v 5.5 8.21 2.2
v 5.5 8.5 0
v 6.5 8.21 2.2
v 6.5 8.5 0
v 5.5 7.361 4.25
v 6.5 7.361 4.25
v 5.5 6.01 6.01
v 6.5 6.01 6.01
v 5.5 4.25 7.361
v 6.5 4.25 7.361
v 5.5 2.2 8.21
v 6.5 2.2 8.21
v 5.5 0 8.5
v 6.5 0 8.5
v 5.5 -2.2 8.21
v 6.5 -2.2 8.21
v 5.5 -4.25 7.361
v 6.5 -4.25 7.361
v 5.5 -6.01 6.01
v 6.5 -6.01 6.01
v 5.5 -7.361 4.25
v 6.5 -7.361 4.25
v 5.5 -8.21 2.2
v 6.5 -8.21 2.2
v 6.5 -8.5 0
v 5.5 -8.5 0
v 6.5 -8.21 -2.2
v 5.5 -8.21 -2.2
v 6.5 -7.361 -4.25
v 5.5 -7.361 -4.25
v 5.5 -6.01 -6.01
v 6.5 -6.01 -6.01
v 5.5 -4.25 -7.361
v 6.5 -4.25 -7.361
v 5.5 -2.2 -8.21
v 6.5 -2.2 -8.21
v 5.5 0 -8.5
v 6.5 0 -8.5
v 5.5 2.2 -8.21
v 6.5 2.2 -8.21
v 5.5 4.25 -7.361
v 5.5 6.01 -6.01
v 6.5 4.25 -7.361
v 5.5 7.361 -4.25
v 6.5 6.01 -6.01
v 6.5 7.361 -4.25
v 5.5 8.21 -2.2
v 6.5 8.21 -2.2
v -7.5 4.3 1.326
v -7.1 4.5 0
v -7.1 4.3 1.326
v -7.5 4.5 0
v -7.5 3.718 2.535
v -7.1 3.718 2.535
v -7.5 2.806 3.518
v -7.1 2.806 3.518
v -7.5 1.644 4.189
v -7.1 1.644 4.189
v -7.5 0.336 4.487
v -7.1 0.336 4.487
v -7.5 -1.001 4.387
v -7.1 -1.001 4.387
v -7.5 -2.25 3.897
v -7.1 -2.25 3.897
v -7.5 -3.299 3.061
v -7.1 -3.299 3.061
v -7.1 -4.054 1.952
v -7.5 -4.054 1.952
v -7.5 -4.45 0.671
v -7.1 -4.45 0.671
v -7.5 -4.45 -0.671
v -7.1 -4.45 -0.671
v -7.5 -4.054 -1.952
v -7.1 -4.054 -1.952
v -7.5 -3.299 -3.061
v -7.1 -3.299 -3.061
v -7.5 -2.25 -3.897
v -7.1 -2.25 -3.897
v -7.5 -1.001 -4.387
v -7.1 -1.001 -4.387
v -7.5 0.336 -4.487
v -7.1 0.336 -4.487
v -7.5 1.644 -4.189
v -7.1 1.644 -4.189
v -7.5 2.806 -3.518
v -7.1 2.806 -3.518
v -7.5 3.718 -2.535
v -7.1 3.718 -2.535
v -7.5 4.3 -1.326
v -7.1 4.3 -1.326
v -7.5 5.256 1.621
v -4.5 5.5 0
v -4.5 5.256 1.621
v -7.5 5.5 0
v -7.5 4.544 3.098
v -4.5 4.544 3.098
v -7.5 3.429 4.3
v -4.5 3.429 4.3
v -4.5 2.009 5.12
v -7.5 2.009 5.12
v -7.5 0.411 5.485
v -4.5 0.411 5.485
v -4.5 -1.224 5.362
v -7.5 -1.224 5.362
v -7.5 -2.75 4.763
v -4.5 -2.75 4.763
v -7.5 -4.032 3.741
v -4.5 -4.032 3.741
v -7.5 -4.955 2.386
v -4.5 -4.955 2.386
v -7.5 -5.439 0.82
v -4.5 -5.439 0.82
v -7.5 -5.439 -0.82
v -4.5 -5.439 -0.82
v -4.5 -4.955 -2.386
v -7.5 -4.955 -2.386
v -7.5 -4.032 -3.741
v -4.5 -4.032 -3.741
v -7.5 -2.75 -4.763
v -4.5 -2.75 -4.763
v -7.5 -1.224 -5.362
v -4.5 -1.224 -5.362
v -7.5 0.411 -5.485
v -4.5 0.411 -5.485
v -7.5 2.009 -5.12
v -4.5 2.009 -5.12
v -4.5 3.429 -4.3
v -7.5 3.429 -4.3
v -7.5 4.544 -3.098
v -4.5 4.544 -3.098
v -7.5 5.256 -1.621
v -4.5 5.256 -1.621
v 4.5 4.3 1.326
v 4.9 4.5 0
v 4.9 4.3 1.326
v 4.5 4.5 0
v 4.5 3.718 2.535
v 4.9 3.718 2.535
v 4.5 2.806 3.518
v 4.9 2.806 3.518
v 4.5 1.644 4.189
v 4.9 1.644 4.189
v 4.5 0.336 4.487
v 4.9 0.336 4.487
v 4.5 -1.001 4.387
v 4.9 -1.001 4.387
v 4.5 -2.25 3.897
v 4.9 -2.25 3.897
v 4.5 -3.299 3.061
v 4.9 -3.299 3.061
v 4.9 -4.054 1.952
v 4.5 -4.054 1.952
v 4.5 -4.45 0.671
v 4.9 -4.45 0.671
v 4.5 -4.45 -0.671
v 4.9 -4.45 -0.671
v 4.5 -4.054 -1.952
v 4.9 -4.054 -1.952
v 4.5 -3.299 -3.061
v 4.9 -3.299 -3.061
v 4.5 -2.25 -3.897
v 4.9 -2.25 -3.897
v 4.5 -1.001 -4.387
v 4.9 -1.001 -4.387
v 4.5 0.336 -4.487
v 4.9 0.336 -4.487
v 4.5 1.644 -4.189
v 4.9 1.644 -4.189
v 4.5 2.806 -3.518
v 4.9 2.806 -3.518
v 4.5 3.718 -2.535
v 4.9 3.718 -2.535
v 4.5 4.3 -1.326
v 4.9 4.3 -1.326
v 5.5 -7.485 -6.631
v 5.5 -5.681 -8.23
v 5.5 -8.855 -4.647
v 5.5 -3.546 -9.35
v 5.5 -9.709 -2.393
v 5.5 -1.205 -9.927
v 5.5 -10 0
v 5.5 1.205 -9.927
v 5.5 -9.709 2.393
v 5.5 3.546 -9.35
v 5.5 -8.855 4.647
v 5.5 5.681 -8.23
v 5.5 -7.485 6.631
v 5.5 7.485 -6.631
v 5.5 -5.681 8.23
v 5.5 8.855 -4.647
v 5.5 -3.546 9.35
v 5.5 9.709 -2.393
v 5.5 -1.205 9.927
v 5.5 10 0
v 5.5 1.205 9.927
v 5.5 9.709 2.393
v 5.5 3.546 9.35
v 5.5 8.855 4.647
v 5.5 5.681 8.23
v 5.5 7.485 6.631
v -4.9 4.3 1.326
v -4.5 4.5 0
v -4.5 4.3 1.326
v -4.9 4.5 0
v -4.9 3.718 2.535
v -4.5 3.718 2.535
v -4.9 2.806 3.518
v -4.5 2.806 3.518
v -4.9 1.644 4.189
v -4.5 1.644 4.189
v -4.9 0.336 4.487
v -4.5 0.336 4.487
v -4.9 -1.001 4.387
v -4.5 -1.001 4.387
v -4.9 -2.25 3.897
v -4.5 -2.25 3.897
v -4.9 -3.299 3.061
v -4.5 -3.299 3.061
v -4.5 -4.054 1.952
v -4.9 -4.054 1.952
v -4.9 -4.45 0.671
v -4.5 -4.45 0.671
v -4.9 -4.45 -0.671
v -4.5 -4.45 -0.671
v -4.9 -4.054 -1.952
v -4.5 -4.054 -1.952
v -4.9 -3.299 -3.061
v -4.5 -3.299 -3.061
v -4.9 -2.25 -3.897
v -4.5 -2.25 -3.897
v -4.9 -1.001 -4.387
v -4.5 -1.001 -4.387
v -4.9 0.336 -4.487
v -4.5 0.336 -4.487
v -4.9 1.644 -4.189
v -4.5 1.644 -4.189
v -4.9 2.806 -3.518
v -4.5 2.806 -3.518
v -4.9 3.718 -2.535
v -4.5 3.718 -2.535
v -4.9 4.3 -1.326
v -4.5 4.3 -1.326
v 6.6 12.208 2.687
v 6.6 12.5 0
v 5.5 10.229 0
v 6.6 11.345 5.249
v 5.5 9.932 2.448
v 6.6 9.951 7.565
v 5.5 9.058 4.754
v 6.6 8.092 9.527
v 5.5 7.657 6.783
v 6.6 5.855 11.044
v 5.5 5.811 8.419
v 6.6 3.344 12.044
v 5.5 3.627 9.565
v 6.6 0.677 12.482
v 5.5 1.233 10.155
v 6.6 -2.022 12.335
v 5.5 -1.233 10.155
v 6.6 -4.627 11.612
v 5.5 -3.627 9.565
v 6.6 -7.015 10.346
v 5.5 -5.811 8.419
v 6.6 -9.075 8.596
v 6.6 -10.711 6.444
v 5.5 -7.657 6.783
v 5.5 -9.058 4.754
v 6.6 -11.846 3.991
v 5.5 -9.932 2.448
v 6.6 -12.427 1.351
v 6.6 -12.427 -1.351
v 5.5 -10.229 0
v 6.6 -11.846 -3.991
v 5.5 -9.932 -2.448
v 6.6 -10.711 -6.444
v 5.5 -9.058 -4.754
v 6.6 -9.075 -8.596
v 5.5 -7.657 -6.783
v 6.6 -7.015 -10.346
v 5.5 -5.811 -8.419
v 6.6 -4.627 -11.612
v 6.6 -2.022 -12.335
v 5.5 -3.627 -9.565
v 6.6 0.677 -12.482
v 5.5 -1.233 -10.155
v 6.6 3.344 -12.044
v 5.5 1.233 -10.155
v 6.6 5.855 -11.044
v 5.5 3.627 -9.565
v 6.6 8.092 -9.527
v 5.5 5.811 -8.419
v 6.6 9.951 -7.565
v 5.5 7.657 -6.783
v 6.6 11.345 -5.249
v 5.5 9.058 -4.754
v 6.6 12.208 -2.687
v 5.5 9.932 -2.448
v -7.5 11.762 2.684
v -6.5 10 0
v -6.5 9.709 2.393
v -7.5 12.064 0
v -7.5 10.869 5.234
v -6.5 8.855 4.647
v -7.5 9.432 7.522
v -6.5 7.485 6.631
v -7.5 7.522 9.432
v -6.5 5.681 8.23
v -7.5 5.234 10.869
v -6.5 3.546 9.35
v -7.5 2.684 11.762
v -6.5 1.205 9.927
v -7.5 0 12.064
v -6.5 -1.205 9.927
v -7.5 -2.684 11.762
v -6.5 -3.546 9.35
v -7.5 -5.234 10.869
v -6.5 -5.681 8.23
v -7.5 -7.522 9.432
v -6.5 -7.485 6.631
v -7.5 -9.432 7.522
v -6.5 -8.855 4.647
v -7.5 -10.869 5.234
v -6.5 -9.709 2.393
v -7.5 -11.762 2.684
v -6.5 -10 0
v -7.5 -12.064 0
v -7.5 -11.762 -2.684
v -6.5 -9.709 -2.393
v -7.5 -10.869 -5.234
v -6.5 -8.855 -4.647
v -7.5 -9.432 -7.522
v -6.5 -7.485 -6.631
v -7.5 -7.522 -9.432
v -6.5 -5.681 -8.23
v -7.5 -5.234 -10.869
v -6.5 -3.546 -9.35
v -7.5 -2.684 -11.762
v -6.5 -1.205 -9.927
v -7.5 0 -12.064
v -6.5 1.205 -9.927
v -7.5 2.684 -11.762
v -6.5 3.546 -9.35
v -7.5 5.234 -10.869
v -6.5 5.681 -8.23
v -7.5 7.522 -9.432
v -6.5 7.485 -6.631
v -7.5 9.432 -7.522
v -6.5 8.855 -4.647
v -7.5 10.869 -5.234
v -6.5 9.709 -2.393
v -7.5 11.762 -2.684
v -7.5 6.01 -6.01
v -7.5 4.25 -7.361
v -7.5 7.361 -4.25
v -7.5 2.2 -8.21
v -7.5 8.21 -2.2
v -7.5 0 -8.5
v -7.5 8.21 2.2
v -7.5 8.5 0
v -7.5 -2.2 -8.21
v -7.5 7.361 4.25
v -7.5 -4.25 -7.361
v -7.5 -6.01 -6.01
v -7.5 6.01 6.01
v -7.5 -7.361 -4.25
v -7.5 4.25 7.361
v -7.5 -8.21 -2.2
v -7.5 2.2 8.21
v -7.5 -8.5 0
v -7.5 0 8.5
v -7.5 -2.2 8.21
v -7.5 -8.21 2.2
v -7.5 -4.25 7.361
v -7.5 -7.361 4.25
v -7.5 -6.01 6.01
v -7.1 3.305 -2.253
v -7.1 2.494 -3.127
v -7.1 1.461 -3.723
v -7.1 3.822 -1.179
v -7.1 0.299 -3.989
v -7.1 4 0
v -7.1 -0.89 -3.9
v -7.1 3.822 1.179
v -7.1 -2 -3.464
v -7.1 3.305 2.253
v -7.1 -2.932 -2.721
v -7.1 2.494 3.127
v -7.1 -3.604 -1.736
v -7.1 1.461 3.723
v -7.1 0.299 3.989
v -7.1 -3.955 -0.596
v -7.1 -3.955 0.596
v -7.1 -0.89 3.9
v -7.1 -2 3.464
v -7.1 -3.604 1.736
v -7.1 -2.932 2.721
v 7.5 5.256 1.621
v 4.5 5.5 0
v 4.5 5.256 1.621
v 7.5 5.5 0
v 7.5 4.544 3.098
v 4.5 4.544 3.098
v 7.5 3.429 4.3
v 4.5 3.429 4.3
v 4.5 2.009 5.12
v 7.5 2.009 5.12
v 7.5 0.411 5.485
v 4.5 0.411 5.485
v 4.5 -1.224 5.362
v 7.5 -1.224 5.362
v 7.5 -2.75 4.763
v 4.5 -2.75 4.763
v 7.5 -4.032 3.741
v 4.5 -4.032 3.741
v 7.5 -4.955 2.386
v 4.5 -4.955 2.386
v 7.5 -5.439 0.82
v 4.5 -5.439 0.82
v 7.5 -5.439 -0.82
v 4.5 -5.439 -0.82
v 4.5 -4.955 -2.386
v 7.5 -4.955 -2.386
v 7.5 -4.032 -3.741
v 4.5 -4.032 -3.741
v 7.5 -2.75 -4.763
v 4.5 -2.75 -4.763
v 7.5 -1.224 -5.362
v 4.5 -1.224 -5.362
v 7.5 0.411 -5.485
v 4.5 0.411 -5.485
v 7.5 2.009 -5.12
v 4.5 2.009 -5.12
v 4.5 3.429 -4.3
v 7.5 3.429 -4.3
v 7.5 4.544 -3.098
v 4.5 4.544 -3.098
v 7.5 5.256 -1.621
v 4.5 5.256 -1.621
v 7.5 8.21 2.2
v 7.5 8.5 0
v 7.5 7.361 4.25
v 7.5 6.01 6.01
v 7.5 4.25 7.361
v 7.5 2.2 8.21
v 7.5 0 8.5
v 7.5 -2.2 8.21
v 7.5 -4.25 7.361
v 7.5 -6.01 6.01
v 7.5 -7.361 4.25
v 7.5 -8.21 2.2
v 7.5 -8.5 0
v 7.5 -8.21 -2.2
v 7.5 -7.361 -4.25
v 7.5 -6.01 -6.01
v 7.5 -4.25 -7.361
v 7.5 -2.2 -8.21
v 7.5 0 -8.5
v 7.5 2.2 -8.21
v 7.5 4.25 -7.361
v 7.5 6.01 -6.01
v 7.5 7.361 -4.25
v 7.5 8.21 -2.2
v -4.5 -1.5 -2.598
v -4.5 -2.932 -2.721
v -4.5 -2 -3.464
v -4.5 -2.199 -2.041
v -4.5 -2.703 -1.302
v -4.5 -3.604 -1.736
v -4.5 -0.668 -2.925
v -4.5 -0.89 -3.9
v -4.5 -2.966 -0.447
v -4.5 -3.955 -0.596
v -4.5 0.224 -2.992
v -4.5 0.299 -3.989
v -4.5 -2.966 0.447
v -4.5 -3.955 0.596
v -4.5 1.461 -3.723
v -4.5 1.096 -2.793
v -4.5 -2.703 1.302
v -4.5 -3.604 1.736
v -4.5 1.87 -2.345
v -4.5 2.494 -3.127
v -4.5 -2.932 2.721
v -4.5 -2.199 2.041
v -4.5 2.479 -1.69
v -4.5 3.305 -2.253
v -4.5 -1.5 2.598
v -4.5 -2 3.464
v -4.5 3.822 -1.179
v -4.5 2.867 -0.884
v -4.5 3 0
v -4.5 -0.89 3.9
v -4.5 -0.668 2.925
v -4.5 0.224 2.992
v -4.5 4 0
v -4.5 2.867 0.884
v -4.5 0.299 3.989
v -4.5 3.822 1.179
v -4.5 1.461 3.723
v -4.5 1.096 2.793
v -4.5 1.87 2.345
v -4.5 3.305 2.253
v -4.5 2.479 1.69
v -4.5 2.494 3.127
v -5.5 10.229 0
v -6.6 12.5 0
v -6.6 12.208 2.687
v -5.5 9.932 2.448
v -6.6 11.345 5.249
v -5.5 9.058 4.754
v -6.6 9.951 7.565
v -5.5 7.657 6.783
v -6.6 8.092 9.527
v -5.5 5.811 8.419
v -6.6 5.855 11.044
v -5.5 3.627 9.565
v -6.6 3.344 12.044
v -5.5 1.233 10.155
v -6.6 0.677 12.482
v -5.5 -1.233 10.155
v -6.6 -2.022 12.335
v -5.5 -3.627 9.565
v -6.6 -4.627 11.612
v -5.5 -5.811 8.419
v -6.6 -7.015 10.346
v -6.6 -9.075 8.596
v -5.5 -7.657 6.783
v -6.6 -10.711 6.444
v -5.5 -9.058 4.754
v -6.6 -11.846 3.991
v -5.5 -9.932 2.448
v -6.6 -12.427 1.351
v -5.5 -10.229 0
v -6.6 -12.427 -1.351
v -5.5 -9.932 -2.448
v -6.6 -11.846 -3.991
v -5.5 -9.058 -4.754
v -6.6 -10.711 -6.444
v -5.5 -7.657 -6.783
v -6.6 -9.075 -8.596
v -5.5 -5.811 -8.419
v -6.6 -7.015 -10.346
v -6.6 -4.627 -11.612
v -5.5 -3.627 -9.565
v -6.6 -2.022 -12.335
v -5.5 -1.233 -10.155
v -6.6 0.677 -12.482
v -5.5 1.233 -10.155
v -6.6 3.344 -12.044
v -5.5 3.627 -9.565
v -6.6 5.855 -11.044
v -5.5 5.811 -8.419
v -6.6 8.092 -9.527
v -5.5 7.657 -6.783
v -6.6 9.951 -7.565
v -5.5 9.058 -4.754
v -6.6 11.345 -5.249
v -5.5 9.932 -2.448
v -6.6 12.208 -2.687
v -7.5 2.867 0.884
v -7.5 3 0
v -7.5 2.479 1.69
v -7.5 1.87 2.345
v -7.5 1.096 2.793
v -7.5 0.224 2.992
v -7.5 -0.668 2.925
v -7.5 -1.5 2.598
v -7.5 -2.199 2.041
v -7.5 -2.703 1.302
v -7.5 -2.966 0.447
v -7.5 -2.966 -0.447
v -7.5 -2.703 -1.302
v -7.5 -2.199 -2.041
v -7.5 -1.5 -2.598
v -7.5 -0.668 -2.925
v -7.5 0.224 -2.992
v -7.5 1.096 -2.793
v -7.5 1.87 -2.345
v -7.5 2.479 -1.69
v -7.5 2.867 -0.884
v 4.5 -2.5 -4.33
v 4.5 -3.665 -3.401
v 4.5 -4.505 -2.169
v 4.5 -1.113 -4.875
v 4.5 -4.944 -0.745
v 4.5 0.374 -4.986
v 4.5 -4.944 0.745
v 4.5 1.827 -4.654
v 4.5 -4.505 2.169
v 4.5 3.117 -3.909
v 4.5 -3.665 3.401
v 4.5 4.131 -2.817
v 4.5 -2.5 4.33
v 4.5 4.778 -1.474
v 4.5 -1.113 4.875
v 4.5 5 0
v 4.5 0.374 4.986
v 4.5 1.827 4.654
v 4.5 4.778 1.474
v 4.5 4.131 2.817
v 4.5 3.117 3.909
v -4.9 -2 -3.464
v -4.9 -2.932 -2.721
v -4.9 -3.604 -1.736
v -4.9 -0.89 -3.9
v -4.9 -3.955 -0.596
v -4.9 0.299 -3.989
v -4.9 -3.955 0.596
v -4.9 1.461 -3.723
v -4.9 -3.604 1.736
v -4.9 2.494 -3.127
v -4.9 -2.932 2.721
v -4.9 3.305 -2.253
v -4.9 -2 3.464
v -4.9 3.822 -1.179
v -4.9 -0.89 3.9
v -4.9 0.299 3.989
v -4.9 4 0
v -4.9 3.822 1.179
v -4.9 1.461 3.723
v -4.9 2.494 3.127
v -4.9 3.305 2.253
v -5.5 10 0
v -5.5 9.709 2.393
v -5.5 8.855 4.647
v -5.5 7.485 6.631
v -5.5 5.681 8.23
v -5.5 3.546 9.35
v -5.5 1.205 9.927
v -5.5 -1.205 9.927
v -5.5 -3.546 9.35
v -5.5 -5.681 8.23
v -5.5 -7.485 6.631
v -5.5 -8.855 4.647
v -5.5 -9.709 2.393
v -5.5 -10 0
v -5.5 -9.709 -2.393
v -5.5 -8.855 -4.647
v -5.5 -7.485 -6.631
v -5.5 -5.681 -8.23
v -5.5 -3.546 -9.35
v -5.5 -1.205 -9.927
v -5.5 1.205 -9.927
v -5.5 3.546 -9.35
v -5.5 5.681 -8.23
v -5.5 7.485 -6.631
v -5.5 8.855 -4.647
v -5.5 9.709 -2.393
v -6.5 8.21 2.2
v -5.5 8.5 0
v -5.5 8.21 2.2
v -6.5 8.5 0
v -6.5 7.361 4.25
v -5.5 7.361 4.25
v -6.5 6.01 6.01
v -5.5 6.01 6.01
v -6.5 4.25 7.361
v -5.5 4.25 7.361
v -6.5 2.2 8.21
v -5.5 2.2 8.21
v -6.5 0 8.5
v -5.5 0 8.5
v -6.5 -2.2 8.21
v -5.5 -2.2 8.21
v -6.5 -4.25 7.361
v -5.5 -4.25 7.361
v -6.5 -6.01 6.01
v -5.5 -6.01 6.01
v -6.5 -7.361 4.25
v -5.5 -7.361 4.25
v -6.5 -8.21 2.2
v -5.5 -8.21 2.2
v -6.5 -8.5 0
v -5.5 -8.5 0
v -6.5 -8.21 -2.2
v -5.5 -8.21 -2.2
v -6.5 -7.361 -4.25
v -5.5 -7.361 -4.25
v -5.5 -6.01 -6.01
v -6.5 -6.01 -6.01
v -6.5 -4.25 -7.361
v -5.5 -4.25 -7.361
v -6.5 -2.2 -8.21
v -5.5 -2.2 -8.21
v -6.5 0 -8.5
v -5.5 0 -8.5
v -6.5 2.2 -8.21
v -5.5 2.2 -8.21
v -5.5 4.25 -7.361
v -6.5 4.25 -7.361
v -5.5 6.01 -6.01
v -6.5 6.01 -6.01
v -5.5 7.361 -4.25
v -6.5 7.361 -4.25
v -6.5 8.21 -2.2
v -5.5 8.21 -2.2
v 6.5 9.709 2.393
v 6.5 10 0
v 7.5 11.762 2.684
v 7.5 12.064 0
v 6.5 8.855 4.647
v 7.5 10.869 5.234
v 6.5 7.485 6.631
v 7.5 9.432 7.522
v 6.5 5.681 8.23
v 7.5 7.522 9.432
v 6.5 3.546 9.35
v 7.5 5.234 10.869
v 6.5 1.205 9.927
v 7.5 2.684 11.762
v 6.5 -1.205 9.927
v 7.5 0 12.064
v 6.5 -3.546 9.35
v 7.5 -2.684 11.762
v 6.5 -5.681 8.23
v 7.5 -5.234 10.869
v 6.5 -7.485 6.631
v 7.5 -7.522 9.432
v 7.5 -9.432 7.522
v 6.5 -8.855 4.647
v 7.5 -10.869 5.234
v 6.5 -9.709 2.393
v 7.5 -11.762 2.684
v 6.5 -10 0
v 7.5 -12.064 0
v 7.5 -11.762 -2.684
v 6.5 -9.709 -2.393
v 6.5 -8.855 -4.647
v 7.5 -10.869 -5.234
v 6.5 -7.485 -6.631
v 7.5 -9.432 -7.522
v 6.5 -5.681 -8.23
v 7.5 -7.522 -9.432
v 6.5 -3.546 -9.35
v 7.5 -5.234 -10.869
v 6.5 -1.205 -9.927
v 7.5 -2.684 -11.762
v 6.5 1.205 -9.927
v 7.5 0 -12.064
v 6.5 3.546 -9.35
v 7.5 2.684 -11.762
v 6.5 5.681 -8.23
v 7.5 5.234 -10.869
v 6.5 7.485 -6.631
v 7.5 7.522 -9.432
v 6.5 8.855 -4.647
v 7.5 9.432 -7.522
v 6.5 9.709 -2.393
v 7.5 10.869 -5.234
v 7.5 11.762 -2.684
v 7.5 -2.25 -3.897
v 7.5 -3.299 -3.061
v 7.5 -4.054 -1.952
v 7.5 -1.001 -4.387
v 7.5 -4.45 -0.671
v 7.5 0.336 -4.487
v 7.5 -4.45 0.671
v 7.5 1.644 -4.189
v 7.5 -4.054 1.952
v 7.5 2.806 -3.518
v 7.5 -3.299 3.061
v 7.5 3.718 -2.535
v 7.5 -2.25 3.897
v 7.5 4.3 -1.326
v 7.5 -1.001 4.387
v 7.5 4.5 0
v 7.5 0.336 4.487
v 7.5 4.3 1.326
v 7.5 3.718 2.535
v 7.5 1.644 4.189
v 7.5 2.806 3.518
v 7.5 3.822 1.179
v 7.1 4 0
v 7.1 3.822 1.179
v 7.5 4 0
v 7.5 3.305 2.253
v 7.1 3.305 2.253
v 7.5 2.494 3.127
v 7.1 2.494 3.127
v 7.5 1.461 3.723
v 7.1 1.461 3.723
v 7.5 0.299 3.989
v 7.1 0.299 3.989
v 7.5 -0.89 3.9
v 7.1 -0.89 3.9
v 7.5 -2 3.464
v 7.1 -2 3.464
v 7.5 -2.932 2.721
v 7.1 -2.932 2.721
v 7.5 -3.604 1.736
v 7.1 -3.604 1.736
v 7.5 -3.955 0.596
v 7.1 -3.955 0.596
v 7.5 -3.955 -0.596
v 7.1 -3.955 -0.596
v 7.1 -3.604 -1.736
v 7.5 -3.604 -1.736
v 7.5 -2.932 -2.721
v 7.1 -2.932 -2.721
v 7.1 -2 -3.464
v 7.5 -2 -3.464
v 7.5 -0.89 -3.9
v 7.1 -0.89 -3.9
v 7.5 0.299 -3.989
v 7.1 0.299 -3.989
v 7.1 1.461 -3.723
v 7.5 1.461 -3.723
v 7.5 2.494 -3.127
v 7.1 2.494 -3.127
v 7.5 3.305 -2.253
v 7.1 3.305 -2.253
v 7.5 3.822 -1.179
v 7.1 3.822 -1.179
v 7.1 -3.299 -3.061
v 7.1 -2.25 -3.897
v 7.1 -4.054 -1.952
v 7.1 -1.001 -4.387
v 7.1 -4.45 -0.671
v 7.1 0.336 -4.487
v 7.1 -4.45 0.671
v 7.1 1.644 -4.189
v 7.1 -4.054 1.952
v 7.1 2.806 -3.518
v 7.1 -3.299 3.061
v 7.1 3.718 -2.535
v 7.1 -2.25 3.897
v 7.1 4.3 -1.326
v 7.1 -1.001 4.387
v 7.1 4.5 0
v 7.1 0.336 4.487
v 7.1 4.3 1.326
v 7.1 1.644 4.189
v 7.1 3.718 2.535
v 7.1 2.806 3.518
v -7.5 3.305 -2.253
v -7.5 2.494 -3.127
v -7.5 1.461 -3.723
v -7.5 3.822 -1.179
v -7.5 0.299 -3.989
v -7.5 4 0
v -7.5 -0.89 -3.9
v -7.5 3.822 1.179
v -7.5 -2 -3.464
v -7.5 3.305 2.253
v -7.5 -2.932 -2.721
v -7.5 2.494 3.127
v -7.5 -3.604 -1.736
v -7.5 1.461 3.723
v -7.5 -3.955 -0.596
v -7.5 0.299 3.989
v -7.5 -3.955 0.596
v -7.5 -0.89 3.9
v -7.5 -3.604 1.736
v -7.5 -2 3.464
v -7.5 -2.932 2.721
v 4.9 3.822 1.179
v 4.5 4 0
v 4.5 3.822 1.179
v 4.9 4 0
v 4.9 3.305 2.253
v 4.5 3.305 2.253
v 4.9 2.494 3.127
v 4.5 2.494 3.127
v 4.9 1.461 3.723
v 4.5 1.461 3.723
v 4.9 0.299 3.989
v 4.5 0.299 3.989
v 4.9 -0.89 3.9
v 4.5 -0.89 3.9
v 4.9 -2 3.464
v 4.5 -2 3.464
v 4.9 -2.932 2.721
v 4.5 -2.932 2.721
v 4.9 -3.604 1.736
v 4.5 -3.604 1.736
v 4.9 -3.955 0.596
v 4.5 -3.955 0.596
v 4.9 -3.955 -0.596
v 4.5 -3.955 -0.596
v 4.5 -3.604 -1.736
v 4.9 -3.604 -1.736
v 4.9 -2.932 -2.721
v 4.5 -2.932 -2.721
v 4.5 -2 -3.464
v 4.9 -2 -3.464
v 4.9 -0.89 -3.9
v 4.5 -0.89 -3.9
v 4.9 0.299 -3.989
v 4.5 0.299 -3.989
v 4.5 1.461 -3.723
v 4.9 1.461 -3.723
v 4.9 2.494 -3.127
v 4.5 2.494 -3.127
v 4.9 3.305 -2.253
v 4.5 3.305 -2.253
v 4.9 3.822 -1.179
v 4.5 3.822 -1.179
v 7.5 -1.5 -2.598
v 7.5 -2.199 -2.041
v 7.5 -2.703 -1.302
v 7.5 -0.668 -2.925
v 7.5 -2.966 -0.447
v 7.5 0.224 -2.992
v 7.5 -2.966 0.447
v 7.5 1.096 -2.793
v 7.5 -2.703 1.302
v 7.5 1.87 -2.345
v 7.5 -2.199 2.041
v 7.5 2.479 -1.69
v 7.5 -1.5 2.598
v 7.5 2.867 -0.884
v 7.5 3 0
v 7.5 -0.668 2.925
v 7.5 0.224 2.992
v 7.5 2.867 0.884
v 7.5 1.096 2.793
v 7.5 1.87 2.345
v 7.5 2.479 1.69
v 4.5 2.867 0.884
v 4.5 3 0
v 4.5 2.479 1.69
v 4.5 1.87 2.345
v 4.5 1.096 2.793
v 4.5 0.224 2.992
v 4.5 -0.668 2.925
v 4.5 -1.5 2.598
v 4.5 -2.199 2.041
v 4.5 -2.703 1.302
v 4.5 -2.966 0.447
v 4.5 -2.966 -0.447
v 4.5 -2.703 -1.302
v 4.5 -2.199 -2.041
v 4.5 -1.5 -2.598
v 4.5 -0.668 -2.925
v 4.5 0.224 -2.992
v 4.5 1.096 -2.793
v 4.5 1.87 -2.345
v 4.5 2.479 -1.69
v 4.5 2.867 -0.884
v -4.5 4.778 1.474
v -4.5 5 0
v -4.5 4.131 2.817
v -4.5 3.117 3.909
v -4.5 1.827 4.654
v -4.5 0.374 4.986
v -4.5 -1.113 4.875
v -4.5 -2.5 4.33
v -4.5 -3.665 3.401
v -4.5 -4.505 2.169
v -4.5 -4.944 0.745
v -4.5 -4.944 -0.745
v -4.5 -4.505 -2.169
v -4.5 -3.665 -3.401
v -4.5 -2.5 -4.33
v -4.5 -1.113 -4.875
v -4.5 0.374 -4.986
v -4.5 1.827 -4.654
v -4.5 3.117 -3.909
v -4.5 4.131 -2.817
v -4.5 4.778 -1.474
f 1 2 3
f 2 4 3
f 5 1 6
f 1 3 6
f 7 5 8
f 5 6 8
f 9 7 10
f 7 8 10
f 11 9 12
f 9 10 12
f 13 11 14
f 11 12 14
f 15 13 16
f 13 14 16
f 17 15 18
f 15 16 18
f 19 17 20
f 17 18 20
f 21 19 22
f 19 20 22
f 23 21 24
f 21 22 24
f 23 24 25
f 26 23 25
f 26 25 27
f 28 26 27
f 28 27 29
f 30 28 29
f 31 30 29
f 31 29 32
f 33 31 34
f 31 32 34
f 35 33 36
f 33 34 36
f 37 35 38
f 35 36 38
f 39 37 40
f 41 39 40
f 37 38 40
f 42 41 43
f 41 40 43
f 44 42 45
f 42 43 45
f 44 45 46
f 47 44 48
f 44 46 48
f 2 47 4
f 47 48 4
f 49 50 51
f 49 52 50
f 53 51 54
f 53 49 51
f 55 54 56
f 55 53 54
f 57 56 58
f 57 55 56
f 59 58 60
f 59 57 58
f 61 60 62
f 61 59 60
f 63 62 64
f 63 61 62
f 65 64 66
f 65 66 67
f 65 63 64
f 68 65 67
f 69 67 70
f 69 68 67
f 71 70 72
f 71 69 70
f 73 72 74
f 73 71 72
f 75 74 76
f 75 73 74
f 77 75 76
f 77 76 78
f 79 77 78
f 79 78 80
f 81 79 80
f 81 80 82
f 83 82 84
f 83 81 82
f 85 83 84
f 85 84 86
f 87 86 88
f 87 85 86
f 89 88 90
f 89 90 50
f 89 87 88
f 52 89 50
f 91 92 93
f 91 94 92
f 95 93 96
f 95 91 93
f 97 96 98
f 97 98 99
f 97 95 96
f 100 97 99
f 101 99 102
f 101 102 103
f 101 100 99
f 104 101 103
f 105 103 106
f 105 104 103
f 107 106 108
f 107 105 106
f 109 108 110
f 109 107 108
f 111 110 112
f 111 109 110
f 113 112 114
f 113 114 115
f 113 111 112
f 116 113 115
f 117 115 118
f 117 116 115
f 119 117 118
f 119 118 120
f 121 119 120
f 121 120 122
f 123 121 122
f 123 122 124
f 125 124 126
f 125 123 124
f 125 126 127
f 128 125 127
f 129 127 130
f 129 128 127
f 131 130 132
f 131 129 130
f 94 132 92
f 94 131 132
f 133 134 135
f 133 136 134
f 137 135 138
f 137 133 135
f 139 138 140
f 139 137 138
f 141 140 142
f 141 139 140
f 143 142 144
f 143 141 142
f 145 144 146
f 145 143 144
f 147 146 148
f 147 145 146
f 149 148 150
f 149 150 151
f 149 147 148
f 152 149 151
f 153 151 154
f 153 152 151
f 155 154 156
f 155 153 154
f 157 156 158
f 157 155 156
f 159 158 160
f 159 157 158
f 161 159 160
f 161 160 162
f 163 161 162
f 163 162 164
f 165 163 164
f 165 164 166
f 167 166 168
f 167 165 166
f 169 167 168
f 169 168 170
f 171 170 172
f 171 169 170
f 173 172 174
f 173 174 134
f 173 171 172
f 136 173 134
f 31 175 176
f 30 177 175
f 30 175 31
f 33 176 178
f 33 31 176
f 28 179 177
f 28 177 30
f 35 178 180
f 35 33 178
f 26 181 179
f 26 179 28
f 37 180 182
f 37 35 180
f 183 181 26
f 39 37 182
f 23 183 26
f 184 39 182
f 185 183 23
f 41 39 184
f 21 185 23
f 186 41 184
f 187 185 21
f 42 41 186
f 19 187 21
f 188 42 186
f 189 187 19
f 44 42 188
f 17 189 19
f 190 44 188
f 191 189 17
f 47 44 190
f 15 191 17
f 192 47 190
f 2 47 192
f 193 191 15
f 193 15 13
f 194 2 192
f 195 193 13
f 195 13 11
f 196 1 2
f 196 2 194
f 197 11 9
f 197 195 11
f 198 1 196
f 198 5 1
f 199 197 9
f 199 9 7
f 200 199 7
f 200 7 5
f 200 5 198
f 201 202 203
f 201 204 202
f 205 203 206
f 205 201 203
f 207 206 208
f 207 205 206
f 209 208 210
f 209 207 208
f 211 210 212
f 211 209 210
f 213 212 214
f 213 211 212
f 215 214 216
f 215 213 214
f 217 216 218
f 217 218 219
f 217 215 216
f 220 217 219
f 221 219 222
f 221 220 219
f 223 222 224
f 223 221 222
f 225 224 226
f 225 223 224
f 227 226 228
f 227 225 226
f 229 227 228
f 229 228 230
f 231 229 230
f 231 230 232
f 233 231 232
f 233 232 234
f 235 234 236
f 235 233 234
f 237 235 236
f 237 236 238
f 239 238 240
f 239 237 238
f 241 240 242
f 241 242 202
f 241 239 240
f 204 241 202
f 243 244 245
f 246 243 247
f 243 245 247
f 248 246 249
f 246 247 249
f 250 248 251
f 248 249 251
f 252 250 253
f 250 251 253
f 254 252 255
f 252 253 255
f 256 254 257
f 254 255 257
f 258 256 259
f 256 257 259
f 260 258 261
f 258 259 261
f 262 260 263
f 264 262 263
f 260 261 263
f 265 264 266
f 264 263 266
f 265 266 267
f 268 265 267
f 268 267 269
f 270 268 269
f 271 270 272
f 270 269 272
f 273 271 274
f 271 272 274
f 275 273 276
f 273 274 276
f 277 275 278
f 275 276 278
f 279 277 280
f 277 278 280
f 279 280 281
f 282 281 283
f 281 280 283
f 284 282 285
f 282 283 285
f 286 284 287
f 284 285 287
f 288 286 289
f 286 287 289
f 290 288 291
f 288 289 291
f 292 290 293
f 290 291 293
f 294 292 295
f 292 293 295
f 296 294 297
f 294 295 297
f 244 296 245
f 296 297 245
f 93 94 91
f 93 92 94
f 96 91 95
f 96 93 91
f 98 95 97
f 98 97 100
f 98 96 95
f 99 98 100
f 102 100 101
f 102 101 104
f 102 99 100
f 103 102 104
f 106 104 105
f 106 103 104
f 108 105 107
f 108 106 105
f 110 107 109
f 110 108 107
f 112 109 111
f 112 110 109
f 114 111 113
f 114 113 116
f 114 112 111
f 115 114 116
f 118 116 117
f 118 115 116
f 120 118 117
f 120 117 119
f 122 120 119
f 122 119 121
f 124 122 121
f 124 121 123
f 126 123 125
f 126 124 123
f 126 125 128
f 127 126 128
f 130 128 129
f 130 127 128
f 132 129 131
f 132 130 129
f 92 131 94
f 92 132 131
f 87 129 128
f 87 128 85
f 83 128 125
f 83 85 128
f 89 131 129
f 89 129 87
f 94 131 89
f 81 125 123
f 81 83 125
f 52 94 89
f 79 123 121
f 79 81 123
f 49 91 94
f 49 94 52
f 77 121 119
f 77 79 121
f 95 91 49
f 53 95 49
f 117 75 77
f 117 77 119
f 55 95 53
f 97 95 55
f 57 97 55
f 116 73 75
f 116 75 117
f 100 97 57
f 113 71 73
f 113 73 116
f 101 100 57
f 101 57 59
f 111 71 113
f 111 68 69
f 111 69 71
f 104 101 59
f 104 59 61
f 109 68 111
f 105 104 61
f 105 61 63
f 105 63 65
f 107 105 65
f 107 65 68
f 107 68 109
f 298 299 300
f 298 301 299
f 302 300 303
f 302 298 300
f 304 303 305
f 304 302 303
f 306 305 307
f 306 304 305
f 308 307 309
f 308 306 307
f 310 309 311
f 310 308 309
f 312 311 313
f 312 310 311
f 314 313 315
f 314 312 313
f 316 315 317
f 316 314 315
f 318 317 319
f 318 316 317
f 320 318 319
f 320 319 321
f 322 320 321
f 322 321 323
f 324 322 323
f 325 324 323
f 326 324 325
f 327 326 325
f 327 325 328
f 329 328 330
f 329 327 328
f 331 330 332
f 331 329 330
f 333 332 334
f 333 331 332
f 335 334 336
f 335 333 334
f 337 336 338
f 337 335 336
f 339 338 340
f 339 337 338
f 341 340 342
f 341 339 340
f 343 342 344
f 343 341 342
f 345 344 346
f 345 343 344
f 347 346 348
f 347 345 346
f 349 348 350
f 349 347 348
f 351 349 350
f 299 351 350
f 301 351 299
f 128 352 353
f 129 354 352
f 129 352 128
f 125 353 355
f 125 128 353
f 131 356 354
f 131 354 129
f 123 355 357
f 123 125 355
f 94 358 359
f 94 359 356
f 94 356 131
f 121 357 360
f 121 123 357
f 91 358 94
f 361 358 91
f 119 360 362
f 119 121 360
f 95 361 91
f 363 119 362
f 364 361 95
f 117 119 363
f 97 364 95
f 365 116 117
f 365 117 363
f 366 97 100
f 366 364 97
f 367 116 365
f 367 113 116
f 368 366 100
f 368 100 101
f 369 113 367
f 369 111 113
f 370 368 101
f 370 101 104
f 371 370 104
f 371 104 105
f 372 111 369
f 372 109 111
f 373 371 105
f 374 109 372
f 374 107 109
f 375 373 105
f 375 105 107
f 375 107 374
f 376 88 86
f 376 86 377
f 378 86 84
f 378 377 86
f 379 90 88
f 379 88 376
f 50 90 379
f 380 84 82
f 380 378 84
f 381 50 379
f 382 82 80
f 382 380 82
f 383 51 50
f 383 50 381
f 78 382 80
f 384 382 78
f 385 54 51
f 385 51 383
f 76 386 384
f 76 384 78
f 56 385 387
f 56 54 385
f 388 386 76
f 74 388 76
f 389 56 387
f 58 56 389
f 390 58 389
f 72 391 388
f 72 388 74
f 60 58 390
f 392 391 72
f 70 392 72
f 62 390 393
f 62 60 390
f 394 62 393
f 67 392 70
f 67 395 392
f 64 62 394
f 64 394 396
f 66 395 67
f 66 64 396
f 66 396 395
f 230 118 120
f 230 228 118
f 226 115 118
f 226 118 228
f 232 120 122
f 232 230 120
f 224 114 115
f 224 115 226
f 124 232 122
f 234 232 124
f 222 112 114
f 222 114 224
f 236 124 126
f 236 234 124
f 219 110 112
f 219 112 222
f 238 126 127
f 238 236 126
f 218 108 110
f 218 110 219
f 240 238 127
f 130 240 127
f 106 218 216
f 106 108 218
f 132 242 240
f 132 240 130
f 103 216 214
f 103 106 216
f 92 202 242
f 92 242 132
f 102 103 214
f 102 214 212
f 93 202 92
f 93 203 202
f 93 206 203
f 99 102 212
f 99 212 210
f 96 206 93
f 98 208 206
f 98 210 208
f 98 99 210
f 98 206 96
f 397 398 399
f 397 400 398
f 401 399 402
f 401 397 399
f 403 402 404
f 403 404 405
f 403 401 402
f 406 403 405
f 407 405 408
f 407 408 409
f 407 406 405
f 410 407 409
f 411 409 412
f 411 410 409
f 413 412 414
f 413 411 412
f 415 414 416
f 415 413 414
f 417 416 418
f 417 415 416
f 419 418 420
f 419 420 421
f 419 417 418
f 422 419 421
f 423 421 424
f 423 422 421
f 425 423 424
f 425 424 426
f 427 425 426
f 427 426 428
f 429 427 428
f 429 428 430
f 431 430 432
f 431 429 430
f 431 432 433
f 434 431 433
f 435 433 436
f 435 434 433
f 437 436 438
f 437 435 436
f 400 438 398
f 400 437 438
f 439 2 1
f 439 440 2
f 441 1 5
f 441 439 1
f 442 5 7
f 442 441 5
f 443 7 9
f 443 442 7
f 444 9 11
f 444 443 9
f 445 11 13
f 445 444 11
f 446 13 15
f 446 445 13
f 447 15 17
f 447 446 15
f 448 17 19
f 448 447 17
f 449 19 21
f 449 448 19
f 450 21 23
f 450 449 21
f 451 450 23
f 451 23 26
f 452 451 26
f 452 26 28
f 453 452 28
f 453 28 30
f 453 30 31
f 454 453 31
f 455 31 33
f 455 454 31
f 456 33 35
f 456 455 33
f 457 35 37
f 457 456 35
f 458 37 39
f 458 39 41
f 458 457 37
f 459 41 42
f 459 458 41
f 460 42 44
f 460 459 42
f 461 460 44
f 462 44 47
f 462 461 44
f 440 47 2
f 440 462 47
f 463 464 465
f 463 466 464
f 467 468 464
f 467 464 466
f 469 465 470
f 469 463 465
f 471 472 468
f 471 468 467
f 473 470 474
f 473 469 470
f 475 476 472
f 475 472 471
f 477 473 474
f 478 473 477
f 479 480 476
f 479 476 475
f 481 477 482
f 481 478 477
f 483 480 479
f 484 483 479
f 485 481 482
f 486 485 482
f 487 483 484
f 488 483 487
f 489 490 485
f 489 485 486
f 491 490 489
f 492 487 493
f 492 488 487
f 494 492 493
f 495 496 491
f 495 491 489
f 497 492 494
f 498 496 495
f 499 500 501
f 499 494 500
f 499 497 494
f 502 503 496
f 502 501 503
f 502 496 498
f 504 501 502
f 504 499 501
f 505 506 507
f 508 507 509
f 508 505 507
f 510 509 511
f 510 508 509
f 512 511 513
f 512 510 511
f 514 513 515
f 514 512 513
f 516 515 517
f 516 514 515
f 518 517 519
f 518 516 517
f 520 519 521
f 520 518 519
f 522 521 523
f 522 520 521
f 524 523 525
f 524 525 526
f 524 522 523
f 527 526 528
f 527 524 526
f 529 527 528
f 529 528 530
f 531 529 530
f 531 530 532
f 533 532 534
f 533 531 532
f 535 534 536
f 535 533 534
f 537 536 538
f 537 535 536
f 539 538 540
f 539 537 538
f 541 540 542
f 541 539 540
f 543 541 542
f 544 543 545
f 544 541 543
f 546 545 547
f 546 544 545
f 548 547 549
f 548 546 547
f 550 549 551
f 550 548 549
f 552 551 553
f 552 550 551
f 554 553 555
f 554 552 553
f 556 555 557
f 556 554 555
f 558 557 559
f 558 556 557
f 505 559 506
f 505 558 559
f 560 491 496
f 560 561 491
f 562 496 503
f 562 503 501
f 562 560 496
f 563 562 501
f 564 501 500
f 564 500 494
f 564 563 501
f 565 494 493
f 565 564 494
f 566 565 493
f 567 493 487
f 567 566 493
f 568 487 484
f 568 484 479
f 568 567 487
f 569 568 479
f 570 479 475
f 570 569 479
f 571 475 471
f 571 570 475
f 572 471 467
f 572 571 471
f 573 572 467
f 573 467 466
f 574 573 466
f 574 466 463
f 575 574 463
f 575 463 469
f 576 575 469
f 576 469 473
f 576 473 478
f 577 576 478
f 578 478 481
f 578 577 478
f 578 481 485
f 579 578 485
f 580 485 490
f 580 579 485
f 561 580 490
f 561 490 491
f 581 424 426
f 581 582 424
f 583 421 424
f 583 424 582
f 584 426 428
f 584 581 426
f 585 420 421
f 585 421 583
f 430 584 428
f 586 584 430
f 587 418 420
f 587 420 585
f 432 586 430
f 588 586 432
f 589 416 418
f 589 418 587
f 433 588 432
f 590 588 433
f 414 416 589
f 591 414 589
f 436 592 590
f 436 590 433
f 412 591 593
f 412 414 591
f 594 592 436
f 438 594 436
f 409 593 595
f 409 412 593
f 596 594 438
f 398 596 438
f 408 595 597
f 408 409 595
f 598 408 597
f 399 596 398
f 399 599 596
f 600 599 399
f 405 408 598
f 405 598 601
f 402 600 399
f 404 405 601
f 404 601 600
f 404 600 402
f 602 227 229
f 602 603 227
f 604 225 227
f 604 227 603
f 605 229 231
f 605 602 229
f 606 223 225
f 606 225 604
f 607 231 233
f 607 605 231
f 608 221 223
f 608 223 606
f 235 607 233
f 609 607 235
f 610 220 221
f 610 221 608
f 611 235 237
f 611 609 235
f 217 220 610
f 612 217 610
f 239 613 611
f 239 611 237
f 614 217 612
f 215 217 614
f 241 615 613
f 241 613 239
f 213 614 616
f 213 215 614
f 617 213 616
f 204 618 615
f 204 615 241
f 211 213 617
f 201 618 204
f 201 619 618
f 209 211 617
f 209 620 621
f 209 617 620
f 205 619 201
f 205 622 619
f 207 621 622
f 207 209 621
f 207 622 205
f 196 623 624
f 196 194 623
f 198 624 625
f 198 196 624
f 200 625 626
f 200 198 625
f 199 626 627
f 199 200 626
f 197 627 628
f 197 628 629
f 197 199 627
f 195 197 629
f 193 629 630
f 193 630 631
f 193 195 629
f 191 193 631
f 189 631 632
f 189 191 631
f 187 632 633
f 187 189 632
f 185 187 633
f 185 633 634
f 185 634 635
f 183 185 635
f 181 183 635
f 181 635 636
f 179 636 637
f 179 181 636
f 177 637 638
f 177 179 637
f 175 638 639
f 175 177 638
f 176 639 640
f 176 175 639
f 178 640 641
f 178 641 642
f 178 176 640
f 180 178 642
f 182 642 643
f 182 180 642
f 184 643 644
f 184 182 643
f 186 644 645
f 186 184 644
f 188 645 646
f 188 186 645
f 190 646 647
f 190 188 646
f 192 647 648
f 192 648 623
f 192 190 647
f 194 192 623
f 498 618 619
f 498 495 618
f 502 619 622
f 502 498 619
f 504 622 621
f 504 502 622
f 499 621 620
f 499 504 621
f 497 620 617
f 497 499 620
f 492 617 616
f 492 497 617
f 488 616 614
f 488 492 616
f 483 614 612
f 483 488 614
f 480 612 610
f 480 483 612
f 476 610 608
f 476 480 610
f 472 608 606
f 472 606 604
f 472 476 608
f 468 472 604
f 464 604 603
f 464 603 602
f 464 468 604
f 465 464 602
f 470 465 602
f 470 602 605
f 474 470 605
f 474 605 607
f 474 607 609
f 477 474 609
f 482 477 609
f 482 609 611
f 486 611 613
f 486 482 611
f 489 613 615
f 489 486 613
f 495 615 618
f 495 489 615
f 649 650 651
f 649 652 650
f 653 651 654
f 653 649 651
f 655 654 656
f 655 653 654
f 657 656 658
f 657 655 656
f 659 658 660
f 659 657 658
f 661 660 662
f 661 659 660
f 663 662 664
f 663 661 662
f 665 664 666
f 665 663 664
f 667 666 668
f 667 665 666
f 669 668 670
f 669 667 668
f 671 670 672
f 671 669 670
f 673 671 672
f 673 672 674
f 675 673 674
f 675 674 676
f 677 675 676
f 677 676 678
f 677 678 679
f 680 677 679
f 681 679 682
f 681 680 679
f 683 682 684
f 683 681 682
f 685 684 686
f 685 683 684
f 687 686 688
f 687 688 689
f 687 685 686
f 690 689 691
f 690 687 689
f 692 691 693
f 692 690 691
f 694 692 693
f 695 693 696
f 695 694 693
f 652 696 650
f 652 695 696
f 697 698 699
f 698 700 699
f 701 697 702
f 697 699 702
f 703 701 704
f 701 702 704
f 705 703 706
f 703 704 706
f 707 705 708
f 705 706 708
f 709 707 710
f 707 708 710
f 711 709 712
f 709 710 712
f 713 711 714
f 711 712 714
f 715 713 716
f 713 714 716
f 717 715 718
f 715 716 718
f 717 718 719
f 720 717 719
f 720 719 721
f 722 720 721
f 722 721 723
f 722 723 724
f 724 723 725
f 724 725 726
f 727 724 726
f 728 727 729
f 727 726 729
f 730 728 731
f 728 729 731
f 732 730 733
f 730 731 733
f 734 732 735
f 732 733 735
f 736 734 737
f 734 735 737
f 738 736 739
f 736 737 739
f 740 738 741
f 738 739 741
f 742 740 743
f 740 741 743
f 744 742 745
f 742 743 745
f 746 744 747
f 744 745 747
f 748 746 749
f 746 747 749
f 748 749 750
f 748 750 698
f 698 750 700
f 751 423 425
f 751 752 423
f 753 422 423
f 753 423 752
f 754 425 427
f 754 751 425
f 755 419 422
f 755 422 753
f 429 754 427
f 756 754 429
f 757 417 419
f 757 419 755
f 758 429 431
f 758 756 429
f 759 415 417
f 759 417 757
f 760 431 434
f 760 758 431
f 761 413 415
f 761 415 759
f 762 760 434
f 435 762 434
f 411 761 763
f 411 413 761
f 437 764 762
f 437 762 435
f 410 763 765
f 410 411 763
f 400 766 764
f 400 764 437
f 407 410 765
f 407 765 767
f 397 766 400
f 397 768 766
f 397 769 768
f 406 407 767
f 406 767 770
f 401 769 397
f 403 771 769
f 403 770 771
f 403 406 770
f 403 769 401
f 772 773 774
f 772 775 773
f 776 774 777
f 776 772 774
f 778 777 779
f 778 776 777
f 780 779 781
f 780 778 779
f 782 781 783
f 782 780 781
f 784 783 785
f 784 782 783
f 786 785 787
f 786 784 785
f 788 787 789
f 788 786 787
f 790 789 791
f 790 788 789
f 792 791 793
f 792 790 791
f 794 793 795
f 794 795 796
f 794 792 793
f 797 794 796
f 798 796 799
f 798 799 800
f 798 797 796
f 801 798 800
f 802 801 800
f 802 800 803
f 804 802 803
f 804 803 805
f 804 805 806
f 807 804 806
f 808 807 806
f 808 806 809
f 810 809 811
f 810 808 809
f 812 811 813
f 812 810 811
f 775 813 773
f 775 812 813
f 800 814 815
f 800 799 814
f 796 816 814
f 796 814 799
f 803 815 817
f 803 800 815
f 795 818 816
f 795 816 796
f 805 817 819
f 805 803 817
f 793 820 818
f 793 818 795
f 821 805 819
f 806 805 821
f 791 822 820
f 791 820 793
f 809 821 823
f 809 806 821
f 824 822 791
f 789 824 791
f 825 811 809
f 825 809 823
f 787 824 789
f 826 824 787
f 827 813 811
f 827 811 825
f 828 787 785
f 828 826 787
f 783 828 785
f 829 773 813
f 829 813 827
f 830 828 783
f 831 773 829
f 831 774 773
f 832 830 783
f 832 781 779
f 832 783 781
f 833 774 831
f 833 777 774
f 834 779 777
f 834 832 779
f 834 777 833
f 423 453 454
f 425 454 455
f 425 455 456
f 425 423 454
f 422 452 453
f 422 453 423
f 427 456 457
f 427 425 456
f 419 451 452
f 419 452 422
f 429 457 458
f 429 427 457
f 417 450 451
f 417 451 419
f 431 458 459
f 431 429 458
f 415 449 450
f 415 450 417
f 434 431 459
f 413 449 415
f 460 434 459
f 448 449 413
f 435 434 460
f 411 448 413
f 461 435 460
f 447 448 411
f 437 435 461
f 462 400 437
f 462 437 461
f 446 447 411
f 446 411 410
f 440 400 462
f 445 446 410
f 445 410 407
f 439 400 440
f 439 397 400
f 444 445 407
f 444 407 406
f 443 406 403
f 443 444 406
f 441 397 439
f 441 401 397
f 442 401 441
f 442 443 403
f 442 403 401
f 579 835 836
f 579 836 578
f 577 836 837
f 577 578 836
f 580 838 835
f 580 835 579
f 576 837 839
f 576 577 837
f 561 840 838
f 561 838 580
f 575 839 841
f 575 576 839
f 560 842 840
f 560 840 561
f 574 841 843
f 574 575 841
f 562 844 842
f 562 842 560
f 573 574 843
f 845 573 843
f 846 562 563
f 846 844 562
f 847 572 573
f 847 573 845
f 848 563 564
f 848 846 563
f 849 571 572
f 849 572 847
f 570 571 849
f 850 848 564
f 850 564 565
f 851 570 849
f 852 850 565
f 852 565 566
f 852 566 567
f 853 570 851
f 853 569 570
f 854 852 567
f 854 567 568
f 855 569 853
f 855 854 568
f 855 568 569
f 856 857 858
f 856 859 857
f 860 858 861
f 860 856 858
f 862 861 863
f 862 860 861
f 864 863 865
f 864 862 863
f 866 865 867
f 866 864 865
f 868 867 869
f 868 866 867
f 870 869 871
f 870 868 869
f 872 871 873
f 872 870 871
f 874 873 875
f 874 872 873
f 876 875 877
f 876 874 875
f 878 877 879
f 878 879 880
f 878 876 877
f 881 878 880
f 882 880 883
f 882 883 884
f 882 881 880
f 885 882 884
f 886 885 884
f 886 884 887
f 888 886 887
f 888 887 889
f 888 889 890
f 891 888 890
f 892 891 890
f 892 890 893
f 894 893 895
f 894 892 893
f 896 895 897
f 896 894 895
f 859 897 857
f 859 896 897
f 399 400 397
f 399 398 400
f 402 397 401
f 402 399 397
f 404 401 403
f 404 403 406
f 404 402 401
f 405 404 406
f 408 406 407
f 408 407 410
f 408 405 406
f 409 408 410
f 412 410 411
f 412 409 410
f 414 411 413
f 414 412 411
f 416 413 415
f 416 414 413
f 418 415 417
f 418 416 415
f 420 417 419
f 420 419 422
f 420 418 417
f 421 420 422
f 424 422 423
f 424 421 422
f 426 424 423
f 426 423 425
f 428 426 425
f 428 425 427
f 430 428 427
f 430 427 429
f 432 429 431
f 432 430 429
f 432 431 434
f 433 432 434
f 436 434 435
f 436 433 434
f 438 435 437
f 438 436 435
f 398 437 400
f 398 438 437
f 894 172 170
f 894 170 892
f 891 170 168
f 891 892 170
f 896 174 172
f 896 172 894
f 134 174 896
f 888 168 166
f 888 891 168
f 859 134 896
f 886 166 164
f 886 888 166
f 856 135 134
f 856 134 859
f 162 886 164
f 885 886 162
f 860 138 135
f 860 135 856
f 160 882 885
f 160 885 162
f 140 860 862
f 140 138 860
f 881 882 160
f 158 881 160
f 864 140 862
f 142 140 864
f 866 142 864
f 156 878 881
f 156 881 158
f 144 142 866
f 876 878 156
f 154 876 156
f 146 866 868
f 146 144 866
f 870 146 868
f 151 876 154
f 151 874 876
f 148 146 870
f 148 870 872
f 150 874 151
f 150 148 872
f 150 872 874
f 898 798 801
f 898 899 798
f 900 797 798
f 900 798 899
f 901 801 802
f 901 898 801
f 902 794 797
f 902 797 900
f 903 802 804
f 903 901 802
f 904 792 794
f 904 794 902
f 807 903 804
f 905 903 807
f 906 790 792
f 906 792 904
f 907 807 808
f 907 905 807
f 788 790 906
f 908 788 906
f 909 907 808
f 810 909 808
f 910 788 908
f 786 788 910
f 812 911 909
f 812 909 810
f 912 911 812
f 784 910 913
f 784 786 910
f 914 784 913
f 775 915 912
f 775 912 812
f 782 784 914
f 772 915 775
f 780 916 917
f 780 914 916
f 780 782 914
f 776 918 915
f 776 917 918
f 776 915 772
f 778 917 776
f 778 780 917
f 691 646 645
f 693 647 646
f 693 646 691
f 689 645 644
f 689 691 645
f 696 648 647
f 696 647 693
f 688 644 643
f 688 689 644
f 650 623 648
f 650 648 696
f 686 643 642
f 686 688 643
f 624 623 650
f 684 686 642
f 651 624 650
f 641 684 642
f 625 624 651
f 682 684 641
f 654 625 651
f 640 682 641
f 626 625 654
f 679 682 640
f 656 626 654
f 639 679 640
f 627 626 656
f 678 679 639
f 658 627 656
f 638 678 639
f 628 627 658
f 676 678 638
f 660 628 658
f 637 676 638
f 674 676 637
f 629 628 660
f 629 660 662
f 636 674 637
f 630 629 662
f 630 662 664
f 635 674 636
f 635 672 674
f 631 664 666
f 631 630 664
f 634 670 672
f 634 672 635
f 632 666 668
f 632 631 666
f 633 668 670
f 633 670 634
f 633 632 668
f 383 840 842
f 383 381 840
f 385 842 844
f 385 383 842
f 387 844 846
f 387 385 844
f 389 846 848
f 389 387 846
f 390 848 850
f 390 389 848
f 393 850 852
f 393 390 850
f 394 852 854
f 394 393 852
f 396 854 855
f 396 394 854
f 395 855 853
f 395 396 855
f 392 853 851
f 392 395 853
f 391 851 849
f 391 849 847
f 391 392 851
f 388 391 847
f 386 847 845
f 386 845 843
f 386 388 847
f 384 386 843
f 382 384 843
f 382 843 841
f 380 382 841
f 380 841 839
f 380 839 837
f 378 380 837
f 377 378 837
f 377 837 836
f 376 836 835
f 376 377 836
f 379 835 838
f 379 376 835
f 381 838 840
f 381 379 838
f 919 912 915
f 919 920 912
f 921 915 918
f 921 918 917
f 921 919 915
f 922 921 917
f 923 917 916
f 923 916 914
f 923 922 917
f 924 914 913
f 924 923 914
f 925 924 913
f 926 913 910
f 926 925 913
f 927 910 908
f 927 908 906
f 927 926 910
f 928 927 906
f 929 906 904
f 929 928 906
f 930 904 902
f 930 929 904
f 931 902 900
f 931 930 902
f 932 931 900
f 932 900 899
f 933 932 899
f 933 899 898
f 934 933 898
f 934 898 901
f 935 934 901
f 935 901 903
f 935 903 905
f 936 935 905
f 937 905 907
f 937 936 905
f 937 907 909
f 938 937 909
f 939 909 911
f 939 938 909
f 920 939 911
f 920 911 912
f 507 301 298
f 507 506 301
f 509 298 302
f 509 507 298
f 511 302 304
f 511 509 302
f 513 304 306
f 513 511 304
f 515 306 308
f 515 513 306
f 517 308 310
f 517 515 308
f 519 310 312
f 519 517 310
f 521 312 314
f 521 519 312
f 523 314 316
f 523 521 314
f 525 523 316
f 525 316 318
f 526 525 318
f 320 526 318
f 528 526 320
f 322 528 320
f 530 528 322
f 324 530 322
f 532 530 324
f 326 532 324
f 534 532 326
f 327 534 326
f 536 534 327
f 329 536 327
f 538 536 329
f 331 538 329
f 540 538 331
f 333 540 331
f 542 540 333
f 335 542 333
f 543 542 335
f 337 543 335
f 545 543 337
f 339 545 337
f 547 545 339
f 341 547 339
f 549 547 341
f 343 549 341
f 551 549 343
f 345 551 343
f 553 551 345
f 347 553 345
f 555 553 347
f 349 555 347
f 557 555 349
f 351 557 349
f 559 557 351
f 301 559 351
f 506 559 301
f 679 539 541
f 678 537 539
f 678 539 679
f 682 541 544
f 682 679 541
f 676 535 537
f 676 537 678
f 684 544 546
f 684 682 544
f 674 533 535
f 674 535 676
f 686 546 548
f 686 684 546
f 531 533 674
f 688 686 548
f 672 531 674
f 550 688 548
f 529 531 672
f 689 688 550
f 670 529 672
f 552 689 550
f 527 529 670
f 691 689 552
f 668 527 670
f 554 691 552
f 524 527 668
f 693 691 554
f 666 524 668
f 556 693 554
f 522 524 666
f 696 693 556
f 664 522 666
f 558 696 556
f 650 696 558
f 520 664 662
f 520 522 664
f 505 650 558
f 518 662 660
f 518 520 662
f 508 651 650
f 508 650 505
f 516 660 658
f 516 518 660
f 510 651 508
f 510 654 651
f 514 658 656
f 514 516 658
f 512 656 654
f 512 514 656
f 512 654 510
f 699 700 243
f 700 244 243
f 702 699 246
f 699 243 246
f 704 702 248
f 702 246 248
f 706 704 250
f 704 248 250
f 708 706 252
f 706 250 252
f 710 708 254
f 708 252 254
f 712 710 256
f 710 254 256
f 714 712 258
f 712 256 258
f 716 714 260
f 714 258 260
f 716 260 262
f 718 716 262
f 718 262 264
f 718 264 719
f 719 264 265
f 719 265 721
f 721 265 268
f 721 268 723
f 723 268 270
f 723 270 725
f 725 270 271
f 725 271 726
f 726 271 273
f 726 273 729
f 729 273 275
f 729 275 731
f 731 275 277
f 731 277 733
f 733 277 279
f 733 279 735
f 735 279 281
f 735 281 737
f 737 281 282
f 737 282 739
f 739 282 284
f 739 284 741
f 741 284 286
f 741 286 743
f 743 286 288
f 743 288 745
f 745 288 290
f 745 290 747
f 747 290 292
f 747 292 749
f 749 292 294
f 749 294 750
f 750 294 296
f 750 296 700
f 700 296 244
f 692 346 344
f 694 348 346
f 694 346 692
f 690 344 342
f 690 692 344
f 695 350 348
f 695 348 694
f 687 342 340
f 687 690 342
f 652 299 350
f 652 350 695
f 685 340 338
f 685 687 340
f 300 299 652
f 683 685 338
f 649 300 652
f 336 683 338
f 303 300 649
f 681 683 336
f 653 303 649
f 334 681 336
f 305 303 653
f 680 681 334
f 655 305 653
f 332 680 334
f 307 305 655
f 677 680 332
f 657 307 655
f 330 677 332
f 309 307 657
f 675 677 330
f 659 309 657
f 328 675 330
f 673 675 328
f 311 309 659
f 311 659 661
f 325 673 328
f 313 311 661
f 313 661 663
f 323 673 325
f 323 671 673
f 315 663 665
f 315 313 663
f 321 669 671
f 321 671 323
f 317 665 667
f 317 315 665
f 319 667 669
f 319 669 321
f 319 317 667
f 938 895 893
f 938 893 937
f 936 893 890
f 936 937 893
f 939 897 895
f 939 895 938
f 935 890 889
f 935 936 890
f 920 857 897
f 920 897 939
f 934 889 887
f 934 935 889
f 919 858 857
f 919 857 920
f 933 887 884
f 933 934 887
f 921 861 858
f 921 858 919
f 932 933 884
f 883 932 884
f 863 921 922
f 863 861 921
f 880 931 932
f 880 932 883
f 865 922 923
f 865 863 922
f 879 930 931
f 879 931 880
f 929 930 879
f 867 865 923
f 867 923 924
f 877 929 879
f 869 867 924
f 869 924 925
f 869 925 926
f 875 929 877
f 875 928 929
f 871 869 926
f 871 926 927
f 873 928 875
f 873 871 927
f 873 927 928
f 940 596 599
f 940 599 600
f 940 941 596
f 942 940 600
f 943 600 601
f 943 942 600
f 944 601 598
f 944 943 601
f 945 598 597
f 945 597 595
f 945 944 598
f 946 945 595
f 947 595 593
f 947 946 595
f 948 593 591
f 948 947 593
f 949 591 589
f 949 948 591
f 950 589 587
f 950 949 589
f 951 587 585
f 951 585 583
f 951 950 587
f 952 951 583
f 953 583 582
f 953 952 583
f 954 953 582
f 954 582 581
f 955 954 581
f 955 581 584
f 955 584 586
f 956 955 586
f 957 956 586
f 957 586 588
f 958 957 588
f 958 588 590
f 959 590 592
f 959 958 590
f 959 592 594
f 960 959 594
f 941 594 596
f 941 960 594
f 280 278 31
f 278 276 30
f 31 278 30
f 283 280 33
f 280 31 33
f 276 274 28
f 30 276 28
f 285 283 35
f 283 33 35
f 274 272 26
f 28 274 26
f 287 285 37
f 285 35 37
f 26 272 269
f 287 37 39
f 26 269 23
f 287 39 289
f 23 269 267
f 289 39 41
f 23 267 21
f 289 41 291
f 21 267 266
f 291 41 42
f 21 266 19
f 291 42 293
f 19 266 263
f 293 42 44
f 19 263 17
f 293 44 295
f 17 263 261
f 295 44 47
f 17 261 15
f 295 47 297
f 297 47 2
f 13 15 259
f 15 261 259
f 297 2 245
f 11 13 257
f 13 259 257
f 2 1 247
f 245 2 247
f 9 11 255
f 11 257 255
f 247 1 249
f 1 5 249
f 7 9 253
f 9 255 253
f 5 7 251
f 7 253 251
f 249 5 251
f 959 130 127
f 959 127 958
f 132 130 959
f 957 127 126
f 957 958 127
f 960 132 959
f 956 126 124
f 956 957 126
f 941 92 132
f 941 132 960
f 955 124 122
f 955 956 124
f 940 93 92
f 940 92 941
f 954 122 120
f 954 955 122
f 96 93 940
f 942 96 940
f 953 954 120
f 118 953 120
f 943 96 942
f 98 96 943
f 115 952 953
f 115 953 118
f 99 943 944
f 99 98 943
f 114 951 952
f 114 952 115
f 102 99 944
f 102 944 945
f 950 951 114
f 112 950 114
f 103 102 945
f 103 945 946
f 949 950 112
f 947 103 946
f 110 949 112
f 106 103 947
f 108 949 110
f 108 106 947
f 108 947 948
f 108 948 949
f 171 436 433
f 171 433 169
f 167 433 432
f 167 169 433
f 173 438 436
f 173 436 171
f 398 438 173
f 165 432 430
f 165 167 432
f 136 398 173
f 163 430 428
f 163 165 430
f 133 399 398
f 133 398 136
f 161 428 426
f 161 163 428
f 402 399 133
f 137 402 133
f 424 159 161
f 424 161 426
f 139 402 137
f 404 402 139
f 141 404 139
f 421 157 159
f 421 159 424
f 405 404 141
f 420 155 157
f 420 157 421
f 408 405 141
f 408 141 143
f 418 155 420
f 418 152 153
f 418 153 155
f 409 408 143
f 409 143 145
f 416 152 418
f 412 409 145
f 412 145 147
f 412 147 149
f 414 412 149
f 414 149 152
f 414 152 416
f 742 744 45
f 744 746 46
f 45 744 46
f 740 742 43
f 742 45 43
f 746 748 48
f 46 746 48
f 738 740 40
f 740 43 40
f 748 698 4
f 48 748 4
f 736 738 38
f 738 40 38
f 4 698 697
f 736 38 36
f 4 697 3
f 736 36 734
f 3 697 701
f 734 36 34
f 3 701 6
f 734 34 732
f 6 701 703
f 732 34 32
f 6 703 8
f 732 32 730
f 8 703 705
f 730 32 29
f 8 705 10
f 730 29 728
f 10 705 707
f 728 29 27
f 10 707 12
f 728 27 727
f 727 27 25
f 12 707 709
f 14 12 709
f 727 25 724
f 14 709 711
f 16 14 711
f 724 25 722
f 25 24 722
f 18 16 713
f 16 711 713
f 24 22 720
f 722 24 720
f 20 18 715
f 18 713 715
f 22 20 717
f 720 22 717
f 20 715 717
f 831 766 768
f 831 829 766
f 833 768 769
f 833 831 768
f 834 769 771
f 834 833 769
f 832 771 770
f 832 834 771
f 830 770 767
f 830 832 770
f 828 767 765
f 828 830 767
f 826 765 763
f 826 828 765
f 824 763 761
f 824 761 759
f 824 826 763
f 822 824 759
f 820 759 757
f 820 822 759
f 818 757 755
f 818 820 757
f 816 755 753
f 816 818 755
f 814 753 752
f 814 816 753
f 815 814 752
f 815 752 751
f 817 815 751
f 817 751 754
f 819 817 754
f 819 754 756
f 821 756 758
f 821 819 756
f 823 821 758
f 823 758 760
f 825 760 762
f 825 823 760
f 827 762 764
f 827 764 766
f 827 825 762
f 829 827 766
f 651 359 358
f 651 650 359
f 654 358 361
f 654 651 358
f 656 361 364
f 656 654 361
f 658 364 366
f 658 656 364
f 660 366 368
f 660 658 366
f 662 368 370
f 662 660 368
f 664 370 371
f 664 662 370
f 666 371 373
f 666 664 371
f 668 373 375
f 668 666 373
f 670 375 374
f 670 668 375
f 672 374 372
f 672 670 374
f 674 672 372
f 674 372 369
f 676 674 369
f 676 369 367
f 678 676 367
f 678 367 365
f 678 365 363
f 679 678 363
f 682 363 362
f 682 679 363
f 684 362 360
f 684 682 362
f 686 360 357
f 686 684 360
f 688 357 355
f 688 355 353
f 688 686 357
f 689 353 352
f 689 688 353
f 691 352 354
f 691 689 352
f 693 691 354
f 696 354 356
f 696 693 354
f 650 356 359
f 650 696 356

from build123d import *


with BuildPart() as part:
    # Sketch1 → Revolve1 (revolve)
    with BuildSketch(Plane.XY):
        Polygon((-5.5, 10), (5.5, 10), (5.5, 8.5), (7.5, 8.5), (7.5, 5.5), (4.5, 5.5), (4.5, 5), (-4.5, 5), (-4.5, 5.5), (-7.5, 5.5), (-7.5, 8.5), (-5.5, 8.5), align=None)
    revolve(axis=Axis((0, 0, 0), (1, 0, 0)))


with BuildPart() as body_2:
    # Sketch2 → Revolve2 (revolve)
    with BuildSketch(Plane.XY):
        Polygon((5.5, 10.229491938), (5.5, 8.5), (6.5, 8.5), (6.5, 10), (7.5, 12.063979803), (6.60006312, 12.5), align=None)
        Polygon((-6.5, 8.5), (-6.5, 10), (-7.5, 12.063979803), (-6.60006312, 12.5), (-5.5, 10.229491938), (-5.5, 8.5), align=None)
    revolve(axis=Axis((0, 0, 0), (1, 0, 0)))


with BuildPart() as body_3:
    # Sketch3 → Revolve3 (revolve)
    with BuildSketch(Plane.XY):
        Polygon((4.5, 5.5), (7.5, 5.5), (7.5, 4.5), (7.1, 4.5), (7.1, 4), (7.5, 4), (7.5, 3), (4.5, 3), (4.5, 4), (4.9, 4), (4.9, 4.5), (4.5, 4.5), align=None)
        Polygon((-4.5, 4.5), (-4.9, 4.5), (-4.9, 4), (-4.5, 4), (-4.5, 3), (-7.5, 3), (-7.5, 4), (-7.1, 4), (-7.1, 4.5), (-7.5, 4.5), (-7.5, 5.5), (-4.5, 5.5), align=None)
    revolve(axis=Axis((0, 0, 0), (1, 0, 0)))


solid = Compound([part.part, body_2.part, body_3.part])
